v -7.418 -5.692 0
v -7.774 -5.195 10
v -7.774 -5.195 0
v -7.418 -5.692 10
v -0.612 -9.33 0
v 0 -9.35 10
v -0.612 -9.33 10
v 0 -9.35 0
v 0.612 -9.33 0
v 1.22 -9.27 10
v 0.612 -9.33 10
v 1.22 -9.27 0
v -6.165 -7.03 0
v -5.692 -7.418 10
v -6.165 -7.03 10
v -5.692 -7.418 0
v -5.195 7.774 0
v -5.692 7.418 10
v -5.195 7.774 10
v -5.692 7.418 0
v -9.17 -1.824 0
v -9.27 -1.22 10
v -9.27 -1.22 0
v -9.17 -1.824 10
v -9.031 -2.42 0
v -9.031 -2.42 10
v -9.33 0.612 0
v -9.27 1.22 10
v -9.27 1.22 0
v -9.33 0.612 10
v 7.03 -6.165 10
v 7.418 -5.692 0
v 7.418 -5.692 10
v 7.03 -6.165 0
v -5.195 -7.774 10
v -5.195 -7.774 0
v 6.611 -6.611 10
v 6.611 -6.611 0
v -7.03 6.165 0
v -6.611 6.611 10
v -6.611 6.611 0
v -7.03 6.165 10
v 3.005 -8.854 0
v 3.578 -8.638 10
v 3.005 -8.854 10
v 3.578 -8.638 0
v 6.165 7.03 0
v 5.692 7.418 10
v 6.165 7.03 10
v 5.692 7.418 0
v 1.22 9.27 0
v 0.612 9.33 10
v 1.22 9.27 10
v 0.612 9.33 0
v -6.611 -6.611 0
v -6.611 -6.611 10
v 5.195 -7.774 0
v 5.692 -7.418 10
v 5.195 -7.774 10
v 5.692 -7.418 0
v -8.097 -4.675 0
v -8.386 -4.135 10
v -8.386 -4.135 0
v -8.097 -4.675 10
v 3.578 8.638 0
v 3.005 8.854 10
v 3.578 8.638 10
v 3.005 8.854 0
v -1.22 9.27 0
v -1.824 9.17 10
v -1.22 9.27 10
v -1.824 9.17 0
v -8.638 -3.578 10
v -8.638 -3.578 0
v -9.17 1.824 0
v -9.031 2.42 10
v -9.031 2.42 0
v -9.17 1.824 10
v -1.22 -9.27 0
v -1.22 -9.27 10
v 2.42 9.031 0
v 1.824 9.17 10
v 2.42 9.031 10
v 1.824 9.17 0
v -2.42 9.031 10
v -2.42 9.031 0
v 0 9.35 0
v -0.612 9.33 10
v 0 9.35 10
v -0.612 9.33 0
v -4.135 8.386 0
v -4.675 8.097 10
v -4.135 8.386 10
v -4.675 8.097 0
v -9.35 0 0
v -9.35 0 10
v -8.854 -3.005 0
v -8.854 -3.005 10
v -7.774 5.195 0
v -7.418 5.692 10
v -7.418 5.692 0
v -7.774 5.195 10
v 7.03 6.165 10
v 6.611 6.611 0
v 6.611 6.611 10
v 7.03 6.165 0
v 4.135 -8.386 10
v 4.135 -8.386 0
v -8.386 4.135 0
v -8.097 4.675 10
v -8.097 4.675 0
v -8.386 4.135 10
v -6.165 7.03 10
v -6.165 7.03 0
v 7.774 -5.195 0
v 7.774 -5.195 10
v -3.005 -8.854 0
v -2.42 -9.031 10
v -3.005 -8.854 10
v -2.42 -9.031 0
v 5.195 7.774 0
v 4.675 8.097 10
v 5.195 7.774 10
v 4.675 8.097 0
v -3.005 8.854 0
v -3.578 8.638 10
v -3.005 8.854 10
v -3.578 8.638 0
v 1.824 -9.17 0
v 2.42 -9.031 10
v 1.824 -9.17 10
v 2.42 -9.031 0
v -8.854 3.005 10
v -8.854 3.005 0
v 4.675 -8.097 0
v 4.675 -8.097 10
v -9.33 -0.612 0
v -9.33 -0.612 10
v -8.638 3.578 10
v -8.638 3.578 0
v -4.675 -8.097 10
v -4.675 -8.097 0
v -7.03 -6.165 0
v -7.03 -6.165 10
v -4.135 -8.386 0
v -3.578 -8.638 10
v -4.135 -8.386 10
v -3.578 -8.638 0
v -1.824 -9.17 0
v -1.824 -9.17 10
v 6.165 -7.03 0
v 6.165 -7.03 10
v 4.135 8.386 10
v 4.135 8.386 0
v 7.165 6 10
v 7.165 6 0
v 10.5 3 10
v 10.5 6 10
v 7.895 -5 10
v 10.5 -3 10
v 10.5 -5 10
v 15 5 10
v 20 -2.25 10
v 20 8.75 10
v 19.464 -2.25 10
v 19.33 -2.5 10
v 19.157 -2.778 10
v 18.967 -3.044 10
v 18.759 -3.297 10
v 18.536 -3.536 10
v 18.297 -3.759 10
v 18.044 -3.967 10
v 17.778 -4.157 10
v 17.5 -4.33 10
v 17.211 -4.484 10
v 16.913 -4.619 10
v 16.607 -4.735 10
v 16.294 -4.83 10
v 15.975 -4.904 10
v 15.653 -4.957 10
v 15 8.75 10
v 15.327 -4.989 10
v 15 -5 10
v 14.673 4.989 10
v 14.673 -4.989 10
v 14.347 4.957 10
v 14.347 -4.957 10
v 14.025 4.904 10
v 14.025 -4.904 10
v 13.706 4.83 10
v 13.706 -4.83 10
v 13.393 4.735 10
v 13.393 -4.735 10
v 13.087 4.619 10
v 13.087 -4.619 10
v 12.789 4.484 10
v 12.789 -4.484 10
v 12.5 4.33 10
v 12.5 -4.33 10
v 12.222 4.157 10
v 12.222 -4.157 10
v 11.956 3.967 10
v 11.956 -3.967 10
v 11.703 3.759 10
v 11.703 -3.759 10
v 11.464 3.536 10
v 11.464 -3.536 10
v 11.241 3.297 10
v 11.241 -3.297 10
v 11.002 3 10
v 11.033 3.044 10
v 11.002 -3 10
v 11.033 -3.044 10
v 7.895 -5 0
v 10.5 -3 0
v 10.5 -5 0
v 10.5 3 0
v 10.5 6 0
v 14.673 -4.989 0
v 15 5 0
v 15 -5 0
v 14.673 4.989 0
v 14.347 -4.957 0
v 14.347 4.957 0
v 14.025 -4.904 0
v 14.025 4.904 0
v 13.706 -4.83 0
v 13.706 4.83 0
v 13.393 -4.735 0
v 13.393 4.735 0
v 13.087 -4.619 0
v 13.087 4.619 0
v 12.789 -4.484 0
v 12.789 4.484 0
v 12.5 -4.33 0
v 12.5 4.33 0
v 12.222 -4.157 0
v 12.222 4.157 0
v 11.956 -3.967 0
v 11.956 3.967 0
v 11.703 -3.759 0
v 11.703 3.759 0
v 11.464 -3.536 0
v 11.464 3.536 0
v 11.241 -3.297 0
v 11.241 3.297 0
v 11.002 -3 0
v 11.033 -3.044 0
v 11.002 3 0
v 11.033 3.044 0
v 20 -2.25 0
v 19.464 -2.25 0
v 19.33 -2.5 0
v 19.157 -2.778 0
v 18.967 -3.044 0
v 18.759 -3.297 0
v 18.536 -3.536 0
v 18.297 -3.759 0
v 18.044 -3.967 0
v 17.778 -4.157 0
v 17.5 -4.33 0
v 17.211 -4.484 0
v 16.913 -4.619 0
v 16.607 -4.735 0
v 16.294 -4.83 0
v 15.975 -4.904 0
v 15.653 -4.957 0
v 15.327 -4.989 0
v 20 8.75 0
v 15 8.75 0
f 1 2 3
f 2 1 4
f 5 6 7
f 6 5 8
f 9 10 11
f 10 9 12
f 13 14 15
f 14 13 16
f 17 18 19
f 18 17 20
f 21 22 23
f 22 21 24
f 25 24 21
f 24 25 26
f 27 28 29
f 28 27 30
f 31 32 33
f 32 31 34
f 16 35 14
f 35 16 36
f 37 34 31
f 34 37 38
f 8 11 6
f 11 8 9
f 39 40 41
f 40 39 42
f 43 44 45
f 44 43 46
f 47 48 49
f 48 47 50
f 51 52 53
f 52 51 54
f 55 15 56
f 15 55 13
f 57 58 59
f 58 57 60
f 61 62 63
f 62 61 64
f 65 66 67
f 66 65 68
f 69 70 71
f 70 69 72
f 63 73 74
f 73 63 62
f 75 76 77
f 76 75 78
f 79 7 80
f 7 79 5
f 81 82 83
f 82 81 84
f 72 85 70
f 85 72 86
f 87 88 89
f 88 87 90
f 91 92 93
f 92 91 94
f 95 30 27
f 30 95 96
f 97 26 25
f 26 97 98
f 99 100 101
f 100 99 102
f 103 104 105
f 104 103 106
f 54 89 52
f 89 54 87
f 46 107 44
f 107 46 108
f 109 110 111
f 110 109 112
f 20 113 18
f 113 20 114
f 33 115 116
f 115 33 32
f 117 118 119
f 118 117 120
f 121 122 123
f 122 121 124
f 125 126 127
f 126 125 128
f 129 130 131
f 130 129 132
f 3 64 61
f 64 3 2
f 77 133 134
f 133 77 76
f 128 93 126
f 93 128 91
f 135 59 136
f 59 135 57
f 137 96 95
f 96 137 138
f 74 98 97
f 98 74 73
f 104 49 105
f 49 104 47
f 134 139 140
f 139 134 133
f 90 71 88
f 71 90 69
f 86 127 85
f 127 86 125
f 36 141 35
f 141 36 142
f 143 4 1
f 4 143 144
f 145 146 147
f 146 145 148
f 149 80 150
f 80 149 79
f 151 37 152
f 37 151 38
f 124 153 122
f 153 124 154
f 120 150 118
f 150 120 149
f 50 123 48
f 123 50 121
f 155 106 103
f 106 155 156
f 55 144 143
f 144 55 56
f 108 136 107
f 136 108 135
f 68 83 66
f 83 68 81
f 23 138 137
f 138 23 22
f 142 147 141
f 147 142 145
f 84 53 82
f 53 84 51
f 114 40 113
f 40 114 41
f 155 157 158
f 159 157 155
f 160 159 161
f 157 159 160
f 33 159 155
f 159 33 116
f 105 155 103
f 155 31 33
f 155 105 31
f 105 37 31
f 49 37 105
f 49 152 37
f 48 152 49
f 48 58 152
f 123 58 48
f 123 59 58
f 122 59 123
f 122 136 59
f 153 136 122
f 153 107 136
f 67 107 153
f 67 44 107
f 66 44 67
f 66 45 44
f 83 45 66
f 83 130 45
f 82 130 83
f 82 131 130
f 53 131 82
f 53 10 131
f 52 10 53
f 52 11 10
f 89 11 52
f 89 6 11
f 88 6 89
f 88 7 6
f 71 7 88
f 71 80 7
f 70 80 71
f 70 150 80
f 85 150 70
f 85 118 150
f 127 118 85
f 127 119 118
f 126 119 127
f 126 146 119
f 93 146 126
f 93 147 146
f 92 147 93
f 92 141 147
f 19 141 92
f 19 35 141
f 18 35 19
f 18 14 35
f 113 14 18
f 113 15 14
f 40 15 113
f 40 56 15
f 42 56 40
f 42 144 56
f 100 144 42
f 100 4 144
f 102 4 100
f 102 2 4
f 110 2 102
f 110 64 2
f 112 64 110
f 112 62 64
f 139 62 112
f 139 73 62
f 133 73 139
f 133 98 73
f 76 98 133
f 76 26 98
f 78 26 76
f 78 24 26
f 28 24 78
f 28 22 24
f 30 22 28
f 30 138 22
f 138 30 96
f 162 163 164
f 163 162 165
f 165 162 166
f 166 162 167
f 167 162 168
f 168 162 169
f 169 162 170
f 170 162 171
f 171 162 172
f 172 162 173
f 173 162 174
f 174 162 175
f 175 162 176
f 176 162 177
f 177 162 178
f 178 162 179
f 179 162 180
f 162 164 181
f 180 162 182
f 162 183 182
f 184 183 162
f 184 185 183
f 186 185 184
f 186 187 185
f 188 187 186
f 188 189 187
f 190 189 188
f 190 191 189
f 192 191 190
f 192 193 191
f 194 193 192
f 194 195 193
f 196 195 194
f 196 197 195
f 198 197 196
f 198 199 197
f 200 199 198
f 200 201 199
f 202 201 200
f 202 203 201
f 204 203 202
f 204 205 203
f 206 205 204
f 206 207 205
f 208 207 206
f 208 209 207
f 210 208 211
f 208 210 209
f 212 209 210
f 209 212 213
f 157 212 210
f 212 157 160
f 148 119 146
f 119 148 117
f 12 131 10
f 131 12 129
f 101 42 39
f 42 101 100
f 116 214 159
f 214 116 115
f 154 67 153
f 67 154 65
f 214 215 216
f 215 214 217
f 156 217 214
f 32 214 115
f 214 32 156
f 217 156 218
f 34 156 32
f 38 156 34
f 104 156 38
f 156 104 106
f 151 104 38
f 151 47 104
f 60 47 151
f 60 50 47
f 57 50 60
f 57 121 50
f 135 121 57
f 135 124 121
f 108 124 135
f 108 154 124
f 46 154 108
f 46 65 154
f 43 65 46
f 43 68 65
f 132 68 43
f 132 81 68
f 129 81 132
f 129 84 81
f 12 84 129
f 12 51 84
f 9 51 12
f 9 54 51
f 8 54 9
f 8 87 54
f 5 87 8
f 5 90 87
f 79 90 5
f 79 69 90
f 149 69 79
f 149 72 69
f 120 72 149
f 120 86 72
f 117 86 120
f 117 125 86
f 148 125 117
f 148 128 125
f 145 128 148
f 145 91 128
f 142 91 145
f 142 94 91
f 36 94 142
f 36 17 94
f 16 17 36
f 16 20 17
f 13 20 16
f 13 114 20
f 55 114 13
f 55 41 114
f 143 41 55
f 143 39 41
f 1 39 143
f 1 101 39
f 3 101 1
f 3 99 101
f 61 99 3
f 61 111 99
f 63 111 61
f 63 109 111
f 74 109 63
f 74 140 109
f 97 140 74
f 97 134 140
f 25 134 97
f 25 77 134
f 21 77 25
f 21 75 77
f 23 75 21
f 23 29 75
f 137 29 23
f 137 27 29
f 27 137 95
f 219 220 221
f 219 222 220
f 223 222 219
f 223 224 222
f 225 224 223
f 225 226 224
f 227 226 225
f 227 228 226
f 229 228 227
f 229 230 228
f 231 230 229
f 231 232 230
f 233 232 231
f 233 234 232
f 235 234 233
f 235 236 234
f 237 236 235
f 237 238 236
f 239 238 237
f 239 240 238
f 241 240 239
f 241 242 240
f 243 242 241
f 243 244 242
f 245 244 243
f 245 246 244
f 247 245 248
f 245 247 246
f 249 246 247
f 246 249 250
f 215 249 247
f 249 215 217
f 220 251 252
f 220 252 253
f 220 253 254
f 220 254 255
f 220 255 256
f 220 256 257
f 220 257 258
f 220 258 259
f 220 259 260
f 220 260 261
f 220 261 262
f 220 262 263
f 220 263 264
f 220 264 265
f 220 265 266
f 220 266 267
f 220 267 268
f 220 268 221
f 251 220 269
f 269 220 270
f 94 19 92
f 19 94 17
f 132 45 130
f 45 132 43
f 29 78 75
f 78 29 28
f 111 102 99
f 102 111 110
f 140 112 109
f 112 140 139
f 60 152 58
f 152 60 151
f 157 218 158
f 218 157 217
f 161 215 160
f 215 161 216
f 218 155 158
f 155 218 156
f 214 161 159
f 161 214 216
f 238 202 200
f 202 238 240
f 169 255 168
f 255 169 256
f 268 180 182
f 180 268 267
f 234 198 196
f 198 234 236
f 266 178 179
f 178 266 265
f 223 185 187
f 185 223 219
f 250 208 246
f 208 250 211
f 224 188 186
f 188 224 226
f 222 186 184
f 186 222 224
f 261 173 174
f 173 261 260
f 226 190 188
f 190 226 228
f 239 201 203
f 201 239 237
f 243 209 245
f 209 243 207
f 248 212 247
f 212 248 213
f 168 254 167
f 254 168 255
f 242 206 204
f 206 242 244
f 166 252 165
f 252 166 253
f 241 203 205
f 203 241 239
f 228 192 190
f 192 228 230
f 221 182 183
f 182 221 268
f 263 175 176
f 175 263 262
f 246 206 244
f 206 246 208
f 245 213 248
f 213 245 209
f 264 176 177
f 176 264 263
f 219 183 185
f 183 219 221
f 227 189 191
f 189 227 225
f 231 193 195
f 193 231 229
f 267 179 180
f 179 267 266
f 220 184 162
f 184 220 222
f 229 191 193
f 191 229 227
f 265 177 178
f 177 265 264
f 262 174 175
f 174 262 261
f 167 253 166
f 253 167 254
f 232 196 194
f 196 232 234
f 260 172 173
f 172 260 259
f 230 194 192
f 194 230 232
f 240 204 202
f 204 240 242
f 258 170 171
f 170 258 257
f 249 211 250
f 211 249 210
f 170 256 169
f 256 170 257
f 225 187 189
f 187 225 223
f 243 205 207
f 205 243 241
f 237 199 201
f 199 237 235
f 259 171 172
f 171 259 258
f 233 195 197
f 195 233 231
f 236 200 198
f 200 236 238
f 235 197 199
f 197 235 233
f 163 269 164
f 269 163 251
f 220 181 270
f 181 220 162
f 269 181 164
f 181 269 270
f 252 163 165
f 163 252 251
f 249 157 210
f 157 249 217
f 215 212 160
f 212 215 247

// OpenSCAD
// Snap-on clip that holds a piece of tubing next to a 12.7 mm (1/2 inch) lab stand rod.
// Print orientation: flat on the bed, a 10 mm tall extrusion of a 2-D profile in the XY plane.
//
// Profile (in the XY plane):
//   (1) a rod ring with 12.7 mm inner diameter and 3 mm wall (18.7 mm outer diameter),
//       centred at the origin, with a 10 mm wide opening cut out of its -X side
//       (everything with x < 0 and -5 < y < 5 is removed from this ring) so it snaps onto the rod;
//   (2) a tubing ring with 6 mm inner diameter and 2 mm wall, centred at x = 15, y = 0,
//       with a 4.5 mm wide opening cut out of its +X side (x > 15 and -2.25 < y < 2.25);
//   (3) a solid bridge 6 mm wide (Y) between x = 8 and x = 12 that joins the two rings
//       without blocking either ring's hole.
//
// NOTE: The user's dimensions were measured with calipers and are in millimetres.
//       The report shows what the part looks like after it is printed and measured again.
//       Compare the two sets of numbers. If anything does not match, fix the model.

$fn = 96;

// ---- Dimensions (mm) ----
rod_id        = 12.7;   // stand rod inner diameter
ring_w        = 3;      // rod ring wall thickness
ring_od       = rod_id + 2 * ring_w;  // 18.7 mm outer diameter
ring_opening  = 10;     // width of the cut-out on the -X side

tubing_id     = 6;      // tubing ring inner diameter
tubing_w      = 2;      // tubing ring wall thickness
tubing_od     = tubing_id + 2 * tubing_w;  // 10 mm outer diameter
tubing_x      = 15;     // tubing ring centre X
tubing_open   = 4.5;    // width of the +X side cut-out

bridge_w      = 6;      // bridge width along Y
bridge_x0     = 8;      // bridge start X
bridge_x1     = 12;     // bridge end X

eps           = 0.5;    // overcut for clean boolean differences

// ---- Model ----
difference() {
    union() {
        // Rod ring
        cylinder(h = 10, d = ring_od);
        // Rod ring opening (removes everything with x < 0 and -5 < y < 5)
        translate([0, -5, 0])
            cube([ring_opening + eps, 10 + 2 * eps, 10]);

        // Tubing ring
        translate([tubing_x, 0, 0])
            cylinder(h = 10, d = tubing_od);
        // Tubing ring opening (removes x > 15 and -2.25 < y < 2.25)
        translate([tubing_x, -tubing_open / 2, 0])
            cube([tubing_open + eps, 10 + 2 * eps, 10]);

        // Solid bridge between x = 8 and x = 12
        translate([bridge_x0, -bridge_w / 2, 0])
            cube([bridge_x1 - bridge_x0 + eps, bridge_w, 10]);
    }
}
